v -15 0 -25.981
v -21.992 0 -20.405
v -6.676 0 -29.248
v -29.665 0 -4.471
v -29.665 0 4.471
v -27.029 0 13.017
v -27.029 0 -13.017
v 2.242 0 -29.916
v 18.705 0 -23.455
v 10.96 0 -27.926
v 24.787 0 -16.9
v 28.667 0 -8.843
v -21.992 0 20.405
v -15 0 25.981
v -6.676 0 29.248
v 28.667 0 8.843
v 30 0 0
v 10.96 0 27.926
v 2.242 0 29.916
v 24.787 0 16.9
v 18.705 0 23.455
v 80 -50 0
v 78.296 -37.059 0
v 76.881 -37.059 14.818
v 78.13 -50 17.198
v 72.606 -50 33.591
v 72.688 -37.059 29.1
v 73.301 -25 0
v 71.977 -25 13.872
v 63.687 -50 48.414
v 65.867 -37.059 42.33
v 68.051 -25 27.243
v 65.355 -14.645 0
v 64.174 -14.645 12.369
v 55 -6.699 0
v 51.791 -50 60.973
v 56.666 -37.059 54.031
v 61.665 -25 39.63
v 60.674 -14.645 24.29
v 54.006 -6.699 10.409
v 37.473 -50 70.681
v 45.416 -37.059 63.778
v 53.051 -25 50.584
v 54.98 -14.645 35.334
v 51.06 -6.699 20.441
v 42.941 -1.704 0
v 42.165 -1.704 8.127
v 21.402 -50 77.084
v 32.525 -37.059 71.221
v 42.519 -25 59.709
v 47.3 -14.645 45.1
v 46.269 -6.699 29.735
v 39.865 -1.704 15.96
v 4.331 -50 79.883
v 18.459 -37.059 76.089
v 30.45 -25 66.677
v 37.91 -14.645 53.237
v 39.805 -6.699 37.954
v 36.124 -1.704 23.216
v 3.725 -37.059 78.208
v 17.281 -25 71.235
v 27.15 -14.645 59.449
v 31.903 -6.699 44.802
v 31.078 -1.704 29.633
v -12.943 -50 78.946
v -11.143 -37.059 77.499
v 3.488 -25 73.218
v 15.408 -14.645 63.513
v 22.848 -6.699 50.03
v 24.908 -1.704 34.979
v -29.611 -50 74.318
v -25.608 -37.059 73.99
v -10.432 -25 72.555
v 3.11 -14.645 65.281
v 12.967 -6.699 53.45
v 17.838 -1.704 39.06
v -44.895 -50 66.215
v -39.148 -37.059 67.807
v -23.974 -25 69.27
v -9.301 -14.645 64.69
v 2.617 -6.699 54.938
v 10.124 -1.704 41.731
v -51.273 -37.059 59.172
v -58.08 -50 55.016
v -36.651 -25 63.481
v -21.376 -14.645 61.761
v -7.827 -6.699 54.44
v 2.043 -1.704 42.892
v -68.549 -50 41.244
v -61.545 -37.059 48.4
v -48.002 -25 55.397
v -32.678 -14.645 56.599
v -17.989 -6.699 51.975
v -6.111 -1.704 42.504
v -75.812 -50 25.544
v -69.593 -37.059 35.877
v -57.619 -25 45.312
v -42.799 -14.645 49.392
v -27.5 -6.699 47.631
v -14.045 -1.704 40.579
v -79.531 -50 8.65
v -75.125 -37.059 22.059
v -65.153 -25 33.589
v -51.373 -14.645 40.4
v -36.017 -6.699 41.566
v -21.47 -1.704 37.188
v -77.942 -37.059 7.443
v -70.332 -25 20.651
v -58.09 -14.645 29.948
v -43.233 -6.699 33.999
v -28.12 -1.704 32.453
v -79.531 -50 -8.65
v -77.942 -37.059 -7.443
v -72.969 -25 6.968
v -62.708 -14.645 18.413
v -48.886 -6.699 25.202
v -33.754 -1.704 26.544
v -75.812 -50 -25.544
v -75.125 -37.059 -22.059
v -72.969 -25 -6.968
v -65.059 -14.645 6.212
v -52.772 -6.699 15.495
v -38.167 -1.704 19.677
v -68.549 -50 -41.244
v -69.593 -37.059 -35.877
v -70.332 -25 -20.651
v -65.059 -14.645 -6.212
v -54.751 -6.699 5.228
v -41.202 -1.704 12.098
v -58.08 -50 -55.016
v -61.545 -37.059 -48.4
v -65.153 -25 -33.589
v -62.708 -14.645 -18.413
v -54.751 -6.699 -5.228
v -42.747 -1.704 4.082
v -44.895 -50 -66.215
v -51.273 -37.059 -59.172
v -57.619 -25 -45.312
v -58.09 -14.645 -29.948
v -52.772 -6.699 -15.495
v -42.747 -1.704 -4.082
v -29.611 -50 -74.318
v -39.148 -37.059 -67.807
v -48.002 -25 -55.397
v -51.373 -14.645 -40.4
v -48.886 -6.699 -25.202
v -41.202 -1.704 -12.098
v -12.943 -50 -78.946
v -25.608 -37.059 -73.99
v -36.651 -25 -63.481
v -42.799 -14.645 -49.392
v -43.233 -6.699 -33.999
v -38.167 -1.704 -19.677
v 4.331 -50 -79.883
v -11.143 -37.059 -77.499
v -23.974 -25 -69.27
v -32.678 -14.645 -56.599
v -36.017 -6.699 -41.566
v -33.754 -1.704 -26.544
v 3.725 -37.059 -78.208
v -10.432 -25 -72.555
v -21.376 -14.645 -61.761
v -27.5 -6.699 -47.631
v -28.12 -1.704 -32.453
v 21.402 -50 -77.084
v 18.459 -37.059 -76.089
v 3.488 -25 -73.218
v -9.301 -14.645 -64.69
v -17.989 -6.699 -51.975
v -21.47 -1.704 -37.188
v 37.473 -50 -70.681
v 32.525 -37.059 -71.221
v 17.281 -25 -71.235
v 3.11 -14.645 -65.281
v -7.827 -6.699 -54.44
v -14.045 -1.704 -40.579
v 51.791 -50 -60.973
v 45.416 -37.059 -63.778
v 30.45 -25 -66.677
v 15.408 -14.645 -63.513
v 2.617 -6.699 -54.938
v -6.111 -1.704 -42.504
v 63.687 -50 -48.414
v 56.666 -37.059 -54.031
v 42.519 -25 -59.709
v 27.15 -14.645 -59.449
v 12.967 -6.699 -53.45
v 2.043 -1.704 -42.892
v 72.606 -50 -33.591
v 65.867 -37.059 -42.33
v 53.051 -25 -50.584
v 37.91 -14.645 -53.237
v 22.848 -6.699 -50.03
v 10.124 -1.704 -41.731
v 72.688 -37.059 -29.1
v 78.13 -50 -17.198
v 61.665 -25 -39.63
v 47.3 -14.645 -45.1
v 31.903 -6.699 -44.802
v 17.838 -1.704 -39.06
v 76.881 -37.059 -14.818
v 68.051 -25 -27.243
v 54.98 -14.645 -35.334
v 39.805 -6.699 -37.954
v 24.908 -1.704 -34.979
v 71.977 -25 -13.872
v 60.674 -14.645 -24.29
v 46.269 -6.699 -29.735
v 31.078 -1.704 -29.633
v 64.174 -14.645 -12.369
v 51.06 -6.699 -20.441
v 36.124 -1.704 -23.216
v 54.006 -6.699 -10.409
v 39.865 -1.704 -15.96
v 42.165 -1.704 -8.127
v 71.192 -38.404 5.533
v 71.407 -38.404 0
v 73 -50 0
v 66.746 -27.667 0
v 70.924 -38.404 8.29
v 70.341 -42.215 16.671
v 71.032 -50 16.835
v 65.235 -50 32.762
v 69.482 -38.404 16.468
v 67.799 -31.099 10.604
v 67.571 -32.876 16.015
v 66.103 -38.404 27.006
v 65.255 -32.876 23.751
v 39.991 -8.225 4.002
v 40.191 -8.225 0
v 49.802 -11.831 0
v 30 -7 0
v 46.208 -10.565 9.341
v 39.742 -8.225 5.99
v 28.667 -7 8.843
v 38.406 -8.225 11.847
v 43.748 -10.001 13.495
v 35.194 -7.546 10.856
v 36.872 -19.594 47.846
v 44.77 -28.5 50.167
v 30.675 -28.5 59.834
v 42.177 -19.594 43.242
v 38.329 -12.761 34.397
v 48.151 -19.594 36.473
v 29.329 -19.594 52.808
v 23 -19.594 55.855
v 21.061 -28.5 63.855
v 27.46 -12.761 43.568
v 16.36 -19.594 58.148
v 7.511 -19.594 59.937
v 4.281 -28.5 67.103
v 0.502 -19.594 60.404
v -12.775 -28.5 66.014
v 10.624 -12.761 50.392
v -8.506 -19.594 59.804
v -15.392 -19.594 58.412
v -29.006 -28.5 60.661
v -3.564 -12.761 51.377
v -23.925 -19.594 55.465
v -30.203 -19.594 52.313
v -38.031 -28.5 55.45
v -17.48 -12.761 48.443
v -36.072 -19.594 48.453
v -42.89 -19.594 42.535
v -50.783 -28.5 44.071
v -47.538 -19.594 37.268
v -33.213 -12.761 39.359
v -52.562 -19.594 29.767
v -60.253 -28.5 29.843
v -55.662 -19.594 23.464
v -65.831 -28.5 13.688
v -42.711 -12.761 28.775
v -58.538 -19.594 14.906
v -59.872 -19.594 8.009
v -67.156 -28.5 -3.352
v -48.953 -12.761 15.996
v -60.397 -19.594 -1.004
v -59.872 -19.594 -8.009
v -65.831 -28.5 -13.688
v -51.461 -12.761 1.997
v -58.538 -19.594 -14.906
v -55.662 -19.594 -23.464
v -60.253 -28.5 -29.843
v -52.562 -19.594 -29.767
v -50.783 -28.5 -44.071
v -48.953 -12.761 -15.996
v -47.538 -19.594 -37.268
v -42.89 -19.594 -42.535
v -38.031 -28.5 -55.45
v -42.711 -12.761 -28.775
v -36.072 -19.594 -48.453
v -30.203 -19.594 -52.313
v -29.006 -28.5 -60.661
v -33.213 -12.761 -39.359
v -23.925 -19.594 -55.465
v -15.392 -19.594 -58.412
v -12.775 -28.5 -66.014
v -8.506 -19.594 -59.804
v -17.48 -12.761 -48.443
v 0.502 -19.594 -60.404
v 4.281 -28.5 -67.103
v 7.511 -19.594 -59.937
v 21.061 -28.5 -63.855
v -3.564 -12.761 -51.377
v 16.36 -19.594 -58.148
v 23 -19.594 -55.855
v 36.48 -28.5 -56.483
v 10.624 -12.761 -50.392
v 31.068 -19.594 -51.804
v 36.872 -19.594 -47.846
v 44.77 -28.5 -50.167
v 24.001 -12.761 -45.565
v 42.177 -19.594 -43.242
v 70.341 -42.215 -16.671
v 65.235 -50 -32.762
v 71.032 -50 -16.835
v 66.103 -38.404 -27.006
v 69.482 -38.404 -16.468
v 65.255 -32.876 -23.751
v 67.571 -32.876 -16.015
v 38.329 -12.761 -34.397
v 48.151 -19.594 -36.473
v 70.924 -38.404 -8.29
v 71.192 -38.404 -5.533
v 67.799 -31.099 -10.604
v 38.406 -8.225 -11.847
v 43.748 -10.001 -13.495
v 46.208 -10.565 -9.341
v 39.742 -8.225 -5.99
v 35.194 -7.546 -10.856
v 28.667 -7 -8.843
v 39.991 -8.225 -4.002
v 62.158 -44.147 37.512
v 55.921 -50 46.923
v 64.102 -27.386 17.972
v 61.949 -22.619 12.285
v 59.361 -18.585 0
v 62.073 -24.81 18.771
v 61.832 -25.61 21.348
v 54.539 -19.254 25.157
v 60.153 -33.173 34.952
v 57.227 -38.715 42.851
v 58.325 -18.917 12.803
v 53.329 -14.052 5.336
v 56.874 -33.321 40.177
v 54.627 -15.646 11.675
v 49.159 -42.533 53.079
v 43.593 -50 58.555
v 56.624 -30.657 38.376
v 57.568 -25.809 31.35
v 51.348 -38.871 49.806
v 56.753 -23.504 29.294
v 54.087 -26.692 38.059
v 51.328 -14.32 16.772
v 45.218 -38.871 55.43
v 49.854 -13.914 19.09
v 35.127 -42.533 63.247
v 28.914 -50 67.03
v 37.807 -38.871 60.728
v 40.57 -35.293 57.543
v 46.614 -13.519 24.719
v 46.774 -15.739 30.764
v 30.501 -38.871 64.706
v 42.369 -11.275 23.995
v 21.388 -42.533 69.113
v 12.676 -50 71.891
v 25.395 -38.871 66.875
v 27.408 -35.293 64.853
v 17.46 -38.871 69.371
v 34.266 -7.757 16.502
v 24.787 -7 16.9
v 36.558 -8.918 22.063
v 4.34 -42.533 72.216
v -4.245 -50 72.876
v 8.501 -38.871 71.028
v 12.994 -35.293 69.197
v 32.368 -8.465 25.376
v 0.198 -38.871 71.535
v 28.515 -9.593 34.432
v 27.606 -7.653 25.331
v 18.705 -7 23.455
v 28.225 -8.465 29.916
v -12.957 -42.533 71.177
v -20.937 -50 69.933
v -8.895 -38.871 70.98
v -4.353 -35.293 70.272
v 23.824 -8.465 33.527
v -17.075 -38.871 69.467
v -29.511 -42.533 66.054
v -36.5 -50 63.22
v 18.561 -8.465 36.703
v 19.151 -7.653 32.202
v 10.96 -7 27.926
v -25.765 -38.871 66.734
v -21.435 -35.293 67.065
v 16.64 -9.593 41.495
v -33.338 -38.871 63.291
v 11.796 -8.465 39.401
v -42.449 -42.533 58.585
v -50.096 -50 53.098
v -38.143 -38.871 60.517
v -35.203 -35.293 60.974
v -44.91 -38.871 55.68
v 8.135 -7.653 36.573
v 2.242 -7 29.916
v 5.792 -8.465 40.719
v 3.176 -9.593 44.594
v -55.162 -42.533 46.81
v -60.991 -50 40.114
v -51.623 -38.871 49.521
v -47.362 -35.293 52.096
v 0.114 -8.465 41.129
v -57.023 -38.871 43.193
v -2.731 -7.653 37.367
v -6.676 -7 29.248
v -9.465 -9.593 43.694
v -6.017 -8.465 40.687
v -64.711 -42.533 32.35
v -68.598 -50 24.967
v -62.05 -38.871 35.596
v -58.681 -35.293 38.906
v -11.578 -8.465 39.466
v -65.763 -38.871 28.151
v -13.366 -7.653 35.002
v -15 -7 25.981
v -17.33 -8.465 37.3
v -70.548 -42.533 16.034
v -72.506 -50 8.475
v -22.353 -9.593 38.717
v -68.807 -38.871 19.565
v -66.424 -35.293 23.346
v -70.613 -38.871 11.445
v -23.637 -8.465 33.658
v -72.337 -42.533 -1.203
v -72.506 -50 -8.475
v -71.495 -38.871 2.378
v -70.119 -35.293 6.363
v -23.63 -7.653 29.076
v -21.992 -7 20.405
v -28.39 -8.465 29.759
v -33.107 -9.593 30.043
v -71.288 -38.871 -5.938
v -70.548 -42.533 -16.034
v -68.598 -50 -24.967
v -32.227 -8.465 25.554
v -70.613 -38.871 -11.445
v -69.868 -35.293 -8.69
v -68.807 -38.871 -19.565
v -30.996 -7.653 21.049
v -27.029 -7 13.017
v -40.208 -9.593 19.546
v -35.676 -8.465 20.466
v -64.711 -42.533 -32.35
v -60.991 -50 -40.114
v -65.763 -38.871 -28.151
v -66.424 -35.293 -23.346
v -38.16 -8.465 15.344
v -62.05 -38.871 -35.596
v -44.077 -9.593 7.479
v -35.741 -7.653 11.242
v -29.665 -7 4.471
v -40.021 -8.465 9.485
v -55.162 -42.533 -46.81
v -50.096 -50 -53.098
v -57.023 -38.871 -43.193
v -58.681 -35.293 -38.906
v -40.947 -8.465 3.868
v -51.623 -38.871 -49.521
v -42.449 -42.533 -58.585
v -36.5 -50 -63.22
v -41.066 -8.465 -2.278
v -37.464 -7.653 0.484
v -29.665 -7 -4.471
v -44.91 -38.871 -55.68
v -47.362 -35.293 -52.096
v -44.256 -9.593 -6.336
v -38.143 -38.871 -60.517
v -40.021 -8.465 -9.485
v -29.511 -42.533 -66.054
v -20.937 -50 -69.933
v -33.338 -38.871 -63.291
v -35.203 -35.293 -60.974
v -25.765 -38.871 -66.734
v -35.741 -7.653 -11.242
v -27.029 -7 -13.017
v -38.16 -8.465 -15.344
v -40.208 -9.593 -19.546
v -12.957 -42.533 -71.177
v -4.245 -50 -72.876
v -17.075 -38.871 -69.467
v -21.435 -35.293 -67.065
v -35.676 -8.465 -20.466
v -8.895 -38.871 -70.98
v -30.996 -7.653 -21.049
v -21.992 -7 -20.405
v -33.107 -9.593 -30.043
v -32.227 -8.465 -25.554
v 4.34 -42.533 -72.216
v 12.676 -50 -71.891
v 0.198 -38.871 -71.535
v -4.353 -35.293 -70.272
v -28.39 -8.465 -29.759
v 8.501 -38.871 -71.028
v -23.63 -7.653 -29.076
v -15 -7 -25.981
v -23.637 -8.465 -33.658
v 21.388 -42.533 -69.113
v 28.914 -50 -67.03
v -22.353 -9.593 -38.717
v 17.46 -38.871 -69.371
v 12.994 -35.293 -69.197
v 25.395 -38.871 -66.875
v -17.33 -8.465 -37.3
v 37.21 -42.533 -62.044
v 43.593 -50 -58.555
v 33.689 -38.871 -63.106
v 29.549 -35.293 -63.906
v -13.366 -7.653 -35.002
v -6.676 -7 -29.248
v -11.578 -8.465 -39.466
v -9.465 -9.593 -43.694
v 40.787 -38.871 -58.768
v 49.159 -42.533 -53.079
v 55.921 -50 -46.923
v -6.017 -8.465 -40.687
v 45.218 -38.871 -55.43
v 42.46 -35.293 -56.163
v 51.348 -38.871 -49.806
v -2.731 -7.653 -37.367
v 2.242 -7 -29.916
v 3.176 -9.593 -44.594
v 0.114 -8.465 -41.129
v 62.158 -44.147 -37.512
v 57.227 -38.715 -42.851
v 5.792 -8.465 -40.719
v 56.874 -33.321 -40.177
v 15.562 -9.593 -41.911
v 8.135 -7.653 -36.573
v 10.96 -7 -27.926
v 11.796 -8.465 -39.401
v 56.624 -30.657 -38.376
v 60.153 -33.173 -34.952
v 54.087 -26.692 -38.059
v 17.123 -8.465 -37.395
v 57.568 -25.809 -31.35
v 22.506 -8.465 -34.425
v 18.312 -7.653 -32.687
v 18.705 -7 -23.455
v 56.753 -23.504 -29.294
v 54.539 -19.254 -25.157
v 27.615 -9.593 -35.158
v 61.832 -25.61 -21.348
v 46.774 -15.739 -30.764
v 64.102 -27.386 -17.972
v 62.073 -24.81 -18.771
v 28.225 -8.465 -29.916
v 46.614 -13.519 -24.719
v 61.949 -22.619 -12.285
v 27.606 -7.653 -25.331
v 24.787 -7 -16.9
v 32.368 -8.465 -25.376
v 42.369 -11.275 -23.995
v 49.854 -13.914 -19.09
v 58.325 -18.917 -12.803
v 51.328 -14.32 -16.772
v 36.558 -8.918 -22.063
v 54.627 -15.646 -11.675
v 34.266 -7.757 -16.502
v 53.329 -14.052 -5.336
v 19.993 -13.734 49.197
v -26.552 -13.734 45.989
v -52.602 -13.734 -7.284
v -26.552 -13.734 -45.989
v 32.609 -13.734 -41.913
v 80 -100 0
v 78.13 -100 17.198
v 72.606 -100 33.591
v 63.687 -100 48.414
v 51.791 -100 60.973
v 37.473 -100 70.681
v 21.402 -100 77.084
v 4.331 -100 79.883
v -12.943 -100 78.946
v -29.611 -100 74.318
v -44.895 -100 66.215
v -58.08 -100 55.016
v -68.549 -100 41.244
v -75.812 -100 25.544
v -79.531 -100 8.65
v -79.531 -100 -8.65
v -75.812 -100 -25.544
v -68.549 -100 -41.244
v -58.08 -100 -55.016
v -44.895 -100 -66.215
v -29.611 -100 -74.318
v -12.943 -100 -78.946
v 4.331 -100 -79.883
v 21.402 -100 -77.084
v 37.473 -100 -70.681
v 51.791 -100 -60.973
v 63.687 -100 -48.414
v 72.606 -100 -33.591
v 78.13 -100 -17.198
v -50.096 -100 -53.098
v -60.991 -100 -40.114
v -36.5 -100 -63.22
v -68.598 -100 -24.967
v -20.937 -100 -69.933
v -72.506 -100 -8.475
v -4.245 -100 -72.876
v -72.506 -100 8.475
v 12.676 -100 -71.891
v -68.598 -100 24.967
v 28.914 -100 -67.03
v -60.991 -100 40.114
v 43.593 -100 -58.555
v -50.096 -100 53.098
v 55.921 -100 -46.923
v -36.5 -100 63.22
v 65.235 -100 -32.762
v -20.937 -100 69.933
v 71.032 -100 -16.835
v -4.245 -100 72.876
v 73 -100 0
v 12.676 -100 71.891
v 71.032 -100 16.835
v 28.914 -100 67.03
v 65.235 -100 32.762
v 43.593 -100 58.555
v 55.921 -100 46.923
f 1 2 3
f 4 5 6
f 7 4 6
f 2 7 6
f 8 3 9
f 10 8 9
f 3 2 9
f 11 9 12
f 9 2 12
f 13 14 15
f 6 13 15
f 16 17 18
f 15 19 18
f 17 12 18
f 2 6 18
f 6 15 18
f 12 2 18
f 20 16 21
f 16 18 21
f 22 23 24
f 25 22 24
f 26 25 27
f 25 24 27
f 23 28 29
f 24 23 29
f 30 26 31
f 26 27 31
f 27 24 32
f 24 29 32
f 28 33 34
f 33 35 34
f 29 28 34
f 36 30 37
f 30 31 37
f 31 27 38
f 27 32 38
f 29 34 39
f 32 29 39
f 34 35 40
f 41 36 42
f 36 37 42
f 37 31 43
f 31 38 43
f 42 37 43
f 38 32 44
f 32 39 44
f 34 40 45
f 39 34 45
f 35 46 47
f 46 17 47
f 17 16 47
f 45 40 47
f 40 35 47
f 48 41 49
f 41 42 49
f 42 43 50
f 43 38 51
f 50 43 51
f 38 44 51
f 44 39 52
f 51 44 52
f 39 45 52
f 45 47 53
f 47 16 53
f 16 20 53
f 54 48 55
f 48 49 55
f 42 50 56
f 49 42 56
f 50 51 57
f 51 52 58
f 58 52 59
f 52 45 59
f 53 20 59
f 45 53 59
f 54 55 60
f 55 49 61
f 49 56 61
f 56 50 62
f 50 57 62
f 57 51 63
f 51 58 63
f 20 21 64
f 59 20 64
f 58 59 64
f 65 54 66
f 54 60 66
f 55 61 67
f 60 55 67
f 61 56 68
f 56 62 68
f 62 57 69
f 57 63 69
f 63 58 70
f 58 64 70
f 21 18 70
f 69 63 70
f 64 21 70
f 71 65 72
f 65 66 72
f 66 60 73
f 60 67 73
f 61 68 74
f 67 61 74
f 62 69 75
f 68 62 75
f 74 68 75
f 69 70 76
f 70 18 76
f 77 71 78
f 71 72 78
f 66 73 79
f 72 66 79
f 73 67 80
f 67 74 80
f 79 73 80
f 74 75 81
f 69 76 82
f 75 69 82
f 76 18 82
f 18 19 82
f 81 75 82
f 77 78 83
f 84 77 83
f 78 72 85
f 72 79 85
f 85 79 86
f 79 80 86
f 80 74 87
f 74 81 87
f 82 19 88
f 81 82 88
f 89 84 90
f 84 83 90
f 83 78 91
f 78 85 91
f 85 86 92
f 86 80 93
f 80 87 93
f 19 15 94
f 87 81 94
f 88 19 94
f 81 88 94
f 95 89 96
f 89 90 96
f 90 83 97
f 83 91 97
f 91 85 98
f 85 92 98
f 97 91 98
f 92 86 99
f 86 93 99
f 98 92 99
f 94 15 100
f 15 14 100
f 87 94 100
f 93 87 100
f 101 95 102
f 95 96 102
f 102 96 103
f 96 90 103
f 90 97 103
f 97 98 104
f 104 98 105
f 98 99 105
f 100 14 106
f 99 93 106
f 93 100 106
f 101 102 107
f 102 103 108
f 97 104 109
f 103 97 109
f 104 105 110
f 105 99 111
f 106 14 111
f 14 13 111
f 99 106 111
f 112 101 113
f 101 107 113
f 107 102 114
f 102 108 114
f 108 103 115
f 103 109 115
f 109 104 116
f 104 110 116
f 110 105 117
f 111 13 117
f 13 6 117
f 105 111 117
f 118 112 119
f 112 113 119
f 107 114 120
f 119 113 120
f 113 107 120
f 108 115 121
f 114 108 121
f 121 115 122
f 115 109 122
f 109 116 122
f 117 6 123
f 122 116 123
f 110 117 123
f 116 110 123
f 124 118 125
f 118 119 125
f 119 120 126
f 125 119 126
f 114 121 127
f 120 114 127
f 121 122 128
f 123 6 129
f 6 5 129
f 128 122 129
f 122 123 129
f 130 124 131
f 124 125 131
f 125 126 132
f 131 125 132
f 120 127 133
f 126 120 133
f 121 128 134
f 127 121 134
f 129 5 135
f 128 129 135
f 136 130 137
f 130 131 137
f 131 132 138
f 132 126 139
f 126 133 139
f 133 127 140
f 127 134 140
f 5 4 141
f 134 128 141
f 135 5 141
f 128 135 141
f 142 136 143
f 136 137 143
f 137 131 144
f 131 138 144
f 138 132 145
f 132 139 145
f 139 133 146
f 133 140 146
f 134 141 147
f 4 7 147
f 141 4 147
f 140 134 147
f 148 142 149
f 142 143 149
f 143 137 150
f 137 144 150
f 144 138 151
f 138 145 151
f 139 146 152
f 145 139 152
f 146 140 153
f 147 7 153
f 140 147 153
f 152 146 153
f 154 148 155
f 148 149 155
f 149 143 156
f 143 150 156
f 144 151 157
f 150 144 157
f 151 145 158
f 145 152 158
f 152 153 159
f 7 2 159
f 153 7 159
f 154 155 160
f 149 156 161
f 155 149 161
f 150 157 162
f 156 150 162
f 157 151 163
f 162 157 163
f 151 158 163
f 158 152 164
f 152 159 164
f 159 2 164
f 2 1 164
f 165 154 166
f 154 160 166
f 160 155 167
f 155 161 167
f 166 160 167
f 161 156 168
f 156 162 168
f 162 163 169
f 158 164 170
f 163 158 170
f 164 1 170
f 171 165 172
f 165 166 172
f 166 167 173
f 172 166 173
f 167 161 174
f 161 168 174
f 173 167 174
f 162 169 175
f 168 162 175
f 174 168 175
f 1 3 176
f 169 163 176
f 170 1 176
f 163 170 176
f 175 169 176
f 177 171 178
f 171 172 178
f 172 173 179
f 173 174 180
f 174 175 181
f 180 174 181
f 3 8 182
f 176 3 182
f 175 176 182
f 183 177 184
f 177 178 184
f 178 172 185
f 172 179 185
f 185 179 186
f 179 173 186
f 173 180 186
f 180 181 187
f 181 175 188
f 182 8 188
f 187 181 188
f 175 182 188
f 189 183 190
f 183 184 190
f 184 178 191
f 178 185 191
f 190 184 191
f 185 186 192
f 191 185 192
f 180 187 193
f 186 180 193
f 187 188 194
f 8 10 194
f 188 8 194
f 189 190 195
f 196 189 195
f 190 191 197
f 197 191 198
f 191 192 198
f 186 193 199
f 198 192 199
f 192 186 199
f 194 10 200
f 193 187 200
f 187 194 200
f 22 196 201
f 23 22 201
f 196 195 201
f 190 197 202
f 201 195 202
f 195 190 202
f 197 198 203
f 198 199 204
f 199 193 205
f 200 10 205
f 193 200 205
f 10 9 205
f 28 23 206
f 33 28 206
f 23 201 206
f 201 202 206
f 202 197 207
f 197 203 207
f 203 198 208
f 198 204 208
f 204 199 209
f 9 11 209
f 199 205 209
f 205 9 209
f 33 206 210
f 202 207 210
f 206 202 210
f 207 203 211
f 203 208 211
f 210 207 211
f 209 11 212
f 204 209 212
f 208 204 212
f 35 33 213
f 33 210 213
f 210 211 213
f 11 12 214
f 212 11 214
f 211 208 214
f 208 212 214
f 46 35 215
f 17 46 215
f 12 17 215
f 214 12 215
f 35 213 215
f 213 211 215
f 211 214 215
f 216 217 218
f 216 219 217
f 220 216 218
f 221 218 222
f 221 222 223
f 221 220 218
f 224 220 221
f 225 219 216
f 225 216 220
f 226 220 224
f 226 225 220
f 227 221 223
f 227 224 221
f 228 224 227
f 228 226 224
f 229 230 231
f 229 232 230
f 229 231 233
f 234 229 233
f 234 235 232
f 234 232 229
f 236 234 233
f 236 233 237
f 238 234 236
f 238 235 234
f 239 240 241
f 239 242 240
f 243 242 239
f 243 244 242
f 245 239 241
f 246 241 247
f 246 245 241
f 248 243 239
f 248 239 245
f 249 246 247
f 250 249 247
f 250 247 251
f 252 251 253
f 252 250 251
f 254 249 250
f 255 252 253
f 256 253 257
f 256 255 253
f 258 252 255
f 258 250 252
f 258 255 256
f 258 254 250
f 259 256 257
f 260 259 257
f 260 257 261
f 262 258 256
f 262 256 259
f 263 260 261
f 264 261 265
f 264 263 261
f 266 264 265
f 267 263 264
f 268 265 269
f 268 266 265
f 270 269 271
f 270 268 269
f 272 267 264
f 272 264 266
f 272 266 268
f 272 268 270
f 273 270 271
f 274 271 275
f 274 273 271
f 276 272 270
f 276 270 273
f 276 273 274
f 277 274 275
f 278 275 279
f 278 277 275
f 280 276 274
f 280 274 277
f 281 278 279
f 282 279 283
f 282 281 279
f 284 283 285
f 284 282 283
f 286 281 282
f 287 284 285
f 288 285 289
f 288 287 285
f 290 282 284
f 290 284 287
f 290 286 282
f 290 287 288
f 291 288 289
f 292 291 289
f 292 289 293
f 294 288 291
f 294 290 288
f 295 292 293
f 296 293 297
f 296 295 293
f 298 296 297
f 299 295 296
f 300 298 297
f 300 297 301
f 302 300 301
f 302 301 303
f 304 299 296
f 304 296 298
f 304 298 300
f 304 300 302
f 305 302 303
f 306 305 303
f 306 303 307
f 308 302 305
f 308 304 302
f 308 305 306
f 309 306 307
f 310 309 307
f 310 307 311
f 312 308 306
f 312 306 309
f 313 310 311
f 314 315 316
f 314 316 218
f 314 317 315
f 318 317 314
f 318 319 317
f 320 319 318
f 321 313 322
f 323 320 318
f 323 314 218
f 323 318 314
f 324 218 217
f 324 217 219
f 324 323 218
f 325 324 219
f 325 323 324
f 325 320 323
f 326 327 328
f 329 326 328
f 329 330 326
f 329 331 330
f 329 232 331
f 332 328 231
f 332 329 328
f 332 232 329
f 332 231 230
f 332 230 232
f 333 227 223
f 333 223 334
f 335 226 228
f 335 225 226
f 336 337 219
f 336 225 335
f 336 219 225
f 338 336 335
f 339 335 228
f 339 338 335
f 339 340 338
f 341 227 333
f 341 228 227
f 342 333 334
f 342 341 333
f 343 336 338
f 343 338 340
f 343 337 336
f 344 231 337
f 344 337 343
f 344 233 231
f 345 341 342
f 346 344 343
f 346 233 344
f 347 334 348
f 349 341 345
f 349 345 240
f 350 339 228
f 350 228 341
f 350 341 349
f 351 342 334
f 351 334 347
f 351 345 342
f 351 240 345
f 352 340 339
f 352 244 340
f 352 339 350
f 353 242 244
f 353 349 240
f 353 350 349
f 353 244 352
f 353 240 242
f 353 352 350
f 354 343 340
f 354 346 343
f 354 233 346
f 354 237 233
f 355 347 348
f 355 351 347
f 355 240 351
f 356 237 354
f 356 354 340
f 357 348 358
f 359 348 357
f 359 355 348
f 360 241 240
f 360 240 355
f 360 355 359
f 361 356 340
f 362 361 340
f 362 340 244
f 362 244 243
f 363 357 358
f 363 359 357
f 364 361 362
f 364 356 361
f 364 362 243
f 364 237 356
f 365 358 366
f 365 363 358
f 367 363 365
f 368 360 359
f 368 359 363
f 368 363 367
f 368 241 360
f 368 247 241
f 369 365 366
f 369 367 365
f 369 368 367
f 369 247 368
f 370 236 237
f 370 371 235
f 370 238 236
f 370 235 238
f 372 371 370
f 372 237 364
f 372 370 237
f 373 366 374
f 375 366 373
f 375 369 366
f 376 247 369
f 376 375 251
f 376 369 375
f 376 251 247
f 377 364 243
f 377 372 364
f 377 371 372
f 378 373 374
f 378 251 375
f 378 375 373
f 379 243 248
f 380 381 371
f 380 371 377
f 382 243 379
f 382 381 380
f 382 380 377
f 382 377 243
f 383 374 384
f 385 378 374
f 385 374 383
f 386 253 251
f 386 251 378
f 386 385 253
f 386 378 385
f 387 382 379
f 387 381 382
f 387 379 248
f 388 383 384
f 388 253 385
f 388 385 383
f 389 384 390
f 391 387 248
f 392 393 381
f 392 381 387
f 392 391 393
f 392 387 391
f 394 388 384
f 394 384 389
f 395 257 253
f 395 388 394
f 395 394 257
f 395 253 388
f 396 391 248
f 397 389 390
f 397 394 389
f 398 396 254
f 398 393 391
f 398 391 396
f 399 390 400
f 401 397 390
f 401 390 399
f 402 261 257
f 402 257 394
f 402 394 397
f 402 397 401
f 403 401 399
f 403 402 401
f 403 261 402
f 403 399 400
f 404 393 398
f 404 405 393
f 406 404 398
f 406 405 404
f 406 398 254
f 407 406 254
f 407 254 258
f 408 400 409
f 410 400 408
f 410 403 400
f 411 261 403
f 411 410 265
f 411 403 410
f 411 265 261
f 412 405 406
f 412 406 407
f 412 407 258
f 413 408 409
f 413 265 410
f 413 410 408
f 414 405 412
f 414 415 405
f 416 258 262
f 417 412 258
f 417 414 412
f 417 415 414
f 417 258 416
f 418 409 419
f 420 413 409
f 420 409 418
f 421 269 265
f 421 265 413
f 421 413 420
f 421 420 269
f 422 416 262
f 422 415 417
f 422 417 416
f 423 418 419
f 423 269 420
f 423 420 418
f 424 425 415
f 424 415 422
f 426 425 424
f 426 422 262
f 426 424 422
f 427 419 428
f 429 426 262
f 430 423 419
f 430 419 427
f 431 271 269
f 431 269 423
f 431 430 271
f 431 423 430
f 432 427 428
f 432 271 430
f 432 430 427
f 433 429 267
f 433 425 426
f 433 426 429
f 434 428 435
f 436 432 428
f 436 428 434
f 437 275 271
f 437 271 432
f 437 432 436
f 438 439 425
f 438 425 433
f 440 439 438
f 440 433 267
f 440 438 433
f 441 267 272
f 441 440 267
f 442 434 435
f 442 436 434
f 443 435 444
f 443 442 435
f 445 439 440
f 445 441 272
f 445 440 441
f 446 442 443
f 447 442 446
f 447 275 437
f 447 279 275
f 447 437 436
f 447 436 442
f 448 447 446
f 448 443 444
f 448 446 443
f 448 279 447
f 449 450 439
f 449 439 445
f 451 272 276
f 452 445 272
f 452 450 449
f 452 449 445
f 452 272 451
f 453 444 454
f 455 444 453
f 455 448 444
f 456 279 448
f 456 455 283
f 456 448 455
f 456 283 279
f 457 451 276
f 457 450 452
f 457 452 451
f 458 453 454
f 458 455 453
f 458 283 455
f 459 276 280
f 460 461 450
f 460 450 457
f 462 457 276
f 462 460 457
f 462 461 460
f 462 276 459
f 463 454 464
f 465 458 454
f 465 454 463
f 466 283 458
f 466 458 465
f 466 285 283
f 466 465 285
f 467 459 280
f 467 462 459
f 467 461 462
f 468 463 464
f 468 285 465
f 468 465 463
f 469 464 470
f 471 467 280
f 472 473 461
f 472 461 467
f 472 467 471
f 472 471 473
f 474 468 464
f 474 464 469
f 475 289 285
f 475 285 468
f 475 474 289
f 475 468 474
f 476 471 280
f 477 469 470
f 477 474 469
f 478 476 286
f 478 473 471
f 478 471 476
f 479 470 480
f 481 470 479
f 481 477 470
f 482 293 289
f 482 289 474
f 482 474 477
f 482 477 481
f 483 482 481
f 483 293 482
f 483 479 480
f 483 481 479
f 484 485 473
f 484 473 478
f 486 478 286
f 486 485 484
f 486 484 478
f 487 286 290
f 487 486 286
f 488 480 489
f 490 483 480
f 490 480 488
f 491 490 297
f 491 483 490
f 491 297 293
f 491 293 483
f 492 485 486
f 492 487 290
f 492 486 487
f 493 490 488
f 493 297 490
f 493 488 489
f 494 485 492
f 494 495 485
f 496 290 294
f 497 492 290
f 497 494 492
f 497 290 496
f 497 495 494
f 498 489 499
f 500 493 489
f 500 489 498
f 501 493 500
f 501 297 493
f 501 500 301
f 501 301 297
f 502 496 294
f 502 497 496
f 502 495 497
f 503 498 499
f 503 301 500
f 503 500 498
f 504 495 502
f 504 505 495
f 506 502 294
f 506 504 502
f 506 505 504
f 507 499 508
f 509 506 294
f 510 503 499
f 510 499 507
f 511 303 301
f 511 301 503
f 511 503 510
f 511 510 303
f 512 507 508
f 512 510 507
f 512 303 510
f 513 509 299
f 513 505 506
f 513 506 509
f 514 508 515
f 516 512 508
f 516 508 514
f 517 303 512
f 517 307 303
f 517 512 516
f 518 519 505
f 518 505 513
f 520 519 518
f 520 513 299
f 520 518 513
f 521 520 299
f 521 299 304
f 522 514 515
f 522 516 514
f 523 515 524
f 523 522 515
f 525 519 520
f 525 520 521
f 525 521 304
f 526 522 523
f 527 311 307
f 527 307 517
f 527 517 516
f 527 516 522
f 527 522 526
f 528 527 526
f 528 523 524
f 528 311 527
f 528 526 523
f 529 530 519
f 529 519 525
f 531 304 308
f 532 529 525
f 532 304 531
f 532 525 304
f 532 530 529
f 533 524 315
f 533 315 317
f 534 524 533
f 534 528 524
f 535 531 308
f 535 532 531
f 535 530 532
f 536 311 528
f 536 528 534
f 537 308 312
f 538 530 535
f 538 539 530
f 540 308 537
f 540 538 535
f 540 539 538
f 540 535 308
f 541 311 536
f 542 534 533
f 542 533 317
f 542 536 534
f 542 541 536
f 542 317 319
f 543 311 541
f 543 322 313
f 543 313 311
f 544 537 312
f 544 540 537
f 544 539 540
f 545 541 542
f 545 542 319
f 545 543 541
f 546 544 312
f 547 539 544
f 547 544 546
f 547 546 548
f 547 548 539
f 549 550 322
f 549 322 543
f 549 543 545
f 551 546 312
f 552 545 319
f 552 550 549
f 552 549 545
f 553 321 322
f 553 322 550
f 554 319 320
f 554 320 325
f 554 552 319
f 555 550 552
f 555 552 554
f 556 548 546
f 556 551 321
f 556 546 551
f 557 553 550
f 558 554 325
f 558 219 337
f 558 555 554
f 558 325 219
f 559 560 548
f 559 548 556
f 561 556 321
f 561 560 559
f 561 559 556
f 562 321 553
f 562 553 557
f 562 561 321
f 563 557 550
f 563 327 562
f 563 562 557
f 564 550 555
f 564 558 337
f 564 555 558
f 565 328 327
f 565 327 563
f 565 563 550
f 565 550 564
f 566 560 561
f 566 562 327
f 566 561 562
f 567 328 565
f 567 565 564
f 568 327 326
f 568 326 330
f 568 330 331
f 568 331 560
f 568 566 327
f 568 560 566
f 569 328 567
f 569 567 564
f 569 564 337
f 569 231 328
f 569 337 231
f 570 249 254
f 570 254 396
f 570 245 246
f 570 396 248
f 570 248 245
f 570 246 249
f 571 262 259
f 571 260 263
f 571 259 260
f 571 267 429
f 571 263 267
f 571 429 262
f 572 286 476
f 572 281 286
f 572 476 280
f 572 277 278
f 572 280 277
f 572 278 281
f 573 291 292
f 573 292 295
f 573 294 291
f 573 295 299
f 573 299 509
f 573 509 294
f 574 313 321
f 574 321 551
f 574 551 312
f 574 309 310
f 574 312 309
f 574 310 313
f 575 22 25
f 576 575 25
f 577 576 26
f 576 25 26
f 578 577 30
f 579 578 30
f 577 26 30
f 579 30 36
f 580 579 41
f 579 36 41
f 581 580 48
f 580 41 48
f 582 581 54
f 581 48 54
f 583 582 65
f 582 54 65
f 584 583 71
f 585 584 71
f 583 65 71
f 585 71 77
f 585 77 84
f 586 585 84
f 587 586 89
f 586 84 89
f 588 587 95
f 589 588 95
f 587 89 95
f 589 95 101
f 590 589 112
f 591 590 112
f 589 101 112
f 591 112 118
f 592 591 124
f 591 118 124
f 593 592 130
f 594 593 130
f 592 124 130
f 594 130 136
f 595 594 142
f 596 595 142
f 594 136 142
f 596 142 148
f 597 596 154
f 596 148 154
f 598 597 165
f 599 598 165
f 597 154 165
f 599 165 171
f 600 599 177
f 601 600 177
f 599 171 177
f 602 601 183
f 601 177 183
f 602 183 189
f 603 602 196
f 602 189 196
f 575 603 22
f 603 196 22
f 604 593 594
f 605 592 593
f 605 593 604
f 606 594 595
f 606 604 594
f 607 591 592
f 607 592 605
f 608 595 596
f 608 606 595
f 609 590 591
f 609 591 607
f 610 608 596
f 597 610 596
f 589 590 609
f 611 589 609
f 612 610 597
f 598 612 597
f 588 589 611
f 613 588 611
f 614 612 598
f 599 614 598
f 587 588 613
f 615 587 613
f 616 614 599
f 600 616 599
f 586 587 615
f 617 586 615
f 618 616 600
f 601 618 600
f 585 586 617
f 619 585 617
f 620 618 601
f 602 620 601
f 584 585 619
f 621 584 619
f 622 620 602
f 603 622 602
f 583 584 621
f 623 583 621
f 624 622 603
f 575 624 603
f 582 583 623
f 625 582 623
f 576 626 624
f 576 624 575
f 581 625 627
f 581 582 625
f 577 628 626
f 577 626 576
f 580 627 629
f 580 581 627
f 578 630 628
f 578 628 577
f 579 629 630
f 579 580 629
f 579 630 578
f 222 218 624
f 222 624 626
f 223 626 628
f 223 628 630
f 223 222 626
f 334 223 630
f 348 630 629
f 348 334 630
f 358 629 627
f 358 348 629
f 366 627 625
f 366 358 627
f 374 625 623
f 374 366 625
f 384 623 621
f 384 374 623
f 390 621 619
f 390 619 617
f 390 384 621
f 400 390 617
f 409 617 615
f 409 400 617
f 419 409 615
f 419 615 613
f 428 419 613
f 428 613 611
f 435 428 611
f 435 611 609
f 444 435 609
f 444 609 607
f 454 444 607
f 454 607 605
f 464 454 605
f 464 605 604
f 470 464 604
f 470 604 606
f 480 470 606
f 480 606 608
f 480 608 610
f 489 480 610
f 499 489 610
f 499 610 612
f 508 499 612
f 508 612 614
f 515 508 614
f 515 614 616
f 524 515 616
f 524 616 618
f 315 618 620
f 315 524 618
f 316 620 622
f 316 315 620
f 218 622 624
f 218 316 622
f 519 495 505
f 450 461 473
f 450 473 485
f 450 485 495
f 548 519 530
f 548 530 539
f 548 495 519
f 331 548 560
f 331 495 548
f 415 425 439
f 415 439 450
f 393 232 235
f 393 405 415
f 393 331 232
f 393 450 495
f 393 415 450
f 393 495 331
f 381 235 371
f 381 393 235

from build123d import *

# Parameters (mm, degrees)
F0_R     = 80
F1_DEPTH = 100
F2_R     = 50
F3_T     = -7


with BuildPart() as f1:
    # F0 (on Front) → F1 (new body)
    with BuildSketch(Plane.XZ):
        Circle(F0_R)
    extrude(amount=F1_DEPTH)

    # F2
    f2_edges = [f1.edges().sort_by_distance(p)[0] for p in [
        (-80, 0, 0),
    ]]
    fillet(f2_edges, radius=F2_R)

    # F3
    f3_openings = [f1.faces().sort_by_distance(p)[0] for p in [
        (0, -100, 0),
    ]]
    offset(amount=F3_T, openings=f3_openings)


solid = f1.part
